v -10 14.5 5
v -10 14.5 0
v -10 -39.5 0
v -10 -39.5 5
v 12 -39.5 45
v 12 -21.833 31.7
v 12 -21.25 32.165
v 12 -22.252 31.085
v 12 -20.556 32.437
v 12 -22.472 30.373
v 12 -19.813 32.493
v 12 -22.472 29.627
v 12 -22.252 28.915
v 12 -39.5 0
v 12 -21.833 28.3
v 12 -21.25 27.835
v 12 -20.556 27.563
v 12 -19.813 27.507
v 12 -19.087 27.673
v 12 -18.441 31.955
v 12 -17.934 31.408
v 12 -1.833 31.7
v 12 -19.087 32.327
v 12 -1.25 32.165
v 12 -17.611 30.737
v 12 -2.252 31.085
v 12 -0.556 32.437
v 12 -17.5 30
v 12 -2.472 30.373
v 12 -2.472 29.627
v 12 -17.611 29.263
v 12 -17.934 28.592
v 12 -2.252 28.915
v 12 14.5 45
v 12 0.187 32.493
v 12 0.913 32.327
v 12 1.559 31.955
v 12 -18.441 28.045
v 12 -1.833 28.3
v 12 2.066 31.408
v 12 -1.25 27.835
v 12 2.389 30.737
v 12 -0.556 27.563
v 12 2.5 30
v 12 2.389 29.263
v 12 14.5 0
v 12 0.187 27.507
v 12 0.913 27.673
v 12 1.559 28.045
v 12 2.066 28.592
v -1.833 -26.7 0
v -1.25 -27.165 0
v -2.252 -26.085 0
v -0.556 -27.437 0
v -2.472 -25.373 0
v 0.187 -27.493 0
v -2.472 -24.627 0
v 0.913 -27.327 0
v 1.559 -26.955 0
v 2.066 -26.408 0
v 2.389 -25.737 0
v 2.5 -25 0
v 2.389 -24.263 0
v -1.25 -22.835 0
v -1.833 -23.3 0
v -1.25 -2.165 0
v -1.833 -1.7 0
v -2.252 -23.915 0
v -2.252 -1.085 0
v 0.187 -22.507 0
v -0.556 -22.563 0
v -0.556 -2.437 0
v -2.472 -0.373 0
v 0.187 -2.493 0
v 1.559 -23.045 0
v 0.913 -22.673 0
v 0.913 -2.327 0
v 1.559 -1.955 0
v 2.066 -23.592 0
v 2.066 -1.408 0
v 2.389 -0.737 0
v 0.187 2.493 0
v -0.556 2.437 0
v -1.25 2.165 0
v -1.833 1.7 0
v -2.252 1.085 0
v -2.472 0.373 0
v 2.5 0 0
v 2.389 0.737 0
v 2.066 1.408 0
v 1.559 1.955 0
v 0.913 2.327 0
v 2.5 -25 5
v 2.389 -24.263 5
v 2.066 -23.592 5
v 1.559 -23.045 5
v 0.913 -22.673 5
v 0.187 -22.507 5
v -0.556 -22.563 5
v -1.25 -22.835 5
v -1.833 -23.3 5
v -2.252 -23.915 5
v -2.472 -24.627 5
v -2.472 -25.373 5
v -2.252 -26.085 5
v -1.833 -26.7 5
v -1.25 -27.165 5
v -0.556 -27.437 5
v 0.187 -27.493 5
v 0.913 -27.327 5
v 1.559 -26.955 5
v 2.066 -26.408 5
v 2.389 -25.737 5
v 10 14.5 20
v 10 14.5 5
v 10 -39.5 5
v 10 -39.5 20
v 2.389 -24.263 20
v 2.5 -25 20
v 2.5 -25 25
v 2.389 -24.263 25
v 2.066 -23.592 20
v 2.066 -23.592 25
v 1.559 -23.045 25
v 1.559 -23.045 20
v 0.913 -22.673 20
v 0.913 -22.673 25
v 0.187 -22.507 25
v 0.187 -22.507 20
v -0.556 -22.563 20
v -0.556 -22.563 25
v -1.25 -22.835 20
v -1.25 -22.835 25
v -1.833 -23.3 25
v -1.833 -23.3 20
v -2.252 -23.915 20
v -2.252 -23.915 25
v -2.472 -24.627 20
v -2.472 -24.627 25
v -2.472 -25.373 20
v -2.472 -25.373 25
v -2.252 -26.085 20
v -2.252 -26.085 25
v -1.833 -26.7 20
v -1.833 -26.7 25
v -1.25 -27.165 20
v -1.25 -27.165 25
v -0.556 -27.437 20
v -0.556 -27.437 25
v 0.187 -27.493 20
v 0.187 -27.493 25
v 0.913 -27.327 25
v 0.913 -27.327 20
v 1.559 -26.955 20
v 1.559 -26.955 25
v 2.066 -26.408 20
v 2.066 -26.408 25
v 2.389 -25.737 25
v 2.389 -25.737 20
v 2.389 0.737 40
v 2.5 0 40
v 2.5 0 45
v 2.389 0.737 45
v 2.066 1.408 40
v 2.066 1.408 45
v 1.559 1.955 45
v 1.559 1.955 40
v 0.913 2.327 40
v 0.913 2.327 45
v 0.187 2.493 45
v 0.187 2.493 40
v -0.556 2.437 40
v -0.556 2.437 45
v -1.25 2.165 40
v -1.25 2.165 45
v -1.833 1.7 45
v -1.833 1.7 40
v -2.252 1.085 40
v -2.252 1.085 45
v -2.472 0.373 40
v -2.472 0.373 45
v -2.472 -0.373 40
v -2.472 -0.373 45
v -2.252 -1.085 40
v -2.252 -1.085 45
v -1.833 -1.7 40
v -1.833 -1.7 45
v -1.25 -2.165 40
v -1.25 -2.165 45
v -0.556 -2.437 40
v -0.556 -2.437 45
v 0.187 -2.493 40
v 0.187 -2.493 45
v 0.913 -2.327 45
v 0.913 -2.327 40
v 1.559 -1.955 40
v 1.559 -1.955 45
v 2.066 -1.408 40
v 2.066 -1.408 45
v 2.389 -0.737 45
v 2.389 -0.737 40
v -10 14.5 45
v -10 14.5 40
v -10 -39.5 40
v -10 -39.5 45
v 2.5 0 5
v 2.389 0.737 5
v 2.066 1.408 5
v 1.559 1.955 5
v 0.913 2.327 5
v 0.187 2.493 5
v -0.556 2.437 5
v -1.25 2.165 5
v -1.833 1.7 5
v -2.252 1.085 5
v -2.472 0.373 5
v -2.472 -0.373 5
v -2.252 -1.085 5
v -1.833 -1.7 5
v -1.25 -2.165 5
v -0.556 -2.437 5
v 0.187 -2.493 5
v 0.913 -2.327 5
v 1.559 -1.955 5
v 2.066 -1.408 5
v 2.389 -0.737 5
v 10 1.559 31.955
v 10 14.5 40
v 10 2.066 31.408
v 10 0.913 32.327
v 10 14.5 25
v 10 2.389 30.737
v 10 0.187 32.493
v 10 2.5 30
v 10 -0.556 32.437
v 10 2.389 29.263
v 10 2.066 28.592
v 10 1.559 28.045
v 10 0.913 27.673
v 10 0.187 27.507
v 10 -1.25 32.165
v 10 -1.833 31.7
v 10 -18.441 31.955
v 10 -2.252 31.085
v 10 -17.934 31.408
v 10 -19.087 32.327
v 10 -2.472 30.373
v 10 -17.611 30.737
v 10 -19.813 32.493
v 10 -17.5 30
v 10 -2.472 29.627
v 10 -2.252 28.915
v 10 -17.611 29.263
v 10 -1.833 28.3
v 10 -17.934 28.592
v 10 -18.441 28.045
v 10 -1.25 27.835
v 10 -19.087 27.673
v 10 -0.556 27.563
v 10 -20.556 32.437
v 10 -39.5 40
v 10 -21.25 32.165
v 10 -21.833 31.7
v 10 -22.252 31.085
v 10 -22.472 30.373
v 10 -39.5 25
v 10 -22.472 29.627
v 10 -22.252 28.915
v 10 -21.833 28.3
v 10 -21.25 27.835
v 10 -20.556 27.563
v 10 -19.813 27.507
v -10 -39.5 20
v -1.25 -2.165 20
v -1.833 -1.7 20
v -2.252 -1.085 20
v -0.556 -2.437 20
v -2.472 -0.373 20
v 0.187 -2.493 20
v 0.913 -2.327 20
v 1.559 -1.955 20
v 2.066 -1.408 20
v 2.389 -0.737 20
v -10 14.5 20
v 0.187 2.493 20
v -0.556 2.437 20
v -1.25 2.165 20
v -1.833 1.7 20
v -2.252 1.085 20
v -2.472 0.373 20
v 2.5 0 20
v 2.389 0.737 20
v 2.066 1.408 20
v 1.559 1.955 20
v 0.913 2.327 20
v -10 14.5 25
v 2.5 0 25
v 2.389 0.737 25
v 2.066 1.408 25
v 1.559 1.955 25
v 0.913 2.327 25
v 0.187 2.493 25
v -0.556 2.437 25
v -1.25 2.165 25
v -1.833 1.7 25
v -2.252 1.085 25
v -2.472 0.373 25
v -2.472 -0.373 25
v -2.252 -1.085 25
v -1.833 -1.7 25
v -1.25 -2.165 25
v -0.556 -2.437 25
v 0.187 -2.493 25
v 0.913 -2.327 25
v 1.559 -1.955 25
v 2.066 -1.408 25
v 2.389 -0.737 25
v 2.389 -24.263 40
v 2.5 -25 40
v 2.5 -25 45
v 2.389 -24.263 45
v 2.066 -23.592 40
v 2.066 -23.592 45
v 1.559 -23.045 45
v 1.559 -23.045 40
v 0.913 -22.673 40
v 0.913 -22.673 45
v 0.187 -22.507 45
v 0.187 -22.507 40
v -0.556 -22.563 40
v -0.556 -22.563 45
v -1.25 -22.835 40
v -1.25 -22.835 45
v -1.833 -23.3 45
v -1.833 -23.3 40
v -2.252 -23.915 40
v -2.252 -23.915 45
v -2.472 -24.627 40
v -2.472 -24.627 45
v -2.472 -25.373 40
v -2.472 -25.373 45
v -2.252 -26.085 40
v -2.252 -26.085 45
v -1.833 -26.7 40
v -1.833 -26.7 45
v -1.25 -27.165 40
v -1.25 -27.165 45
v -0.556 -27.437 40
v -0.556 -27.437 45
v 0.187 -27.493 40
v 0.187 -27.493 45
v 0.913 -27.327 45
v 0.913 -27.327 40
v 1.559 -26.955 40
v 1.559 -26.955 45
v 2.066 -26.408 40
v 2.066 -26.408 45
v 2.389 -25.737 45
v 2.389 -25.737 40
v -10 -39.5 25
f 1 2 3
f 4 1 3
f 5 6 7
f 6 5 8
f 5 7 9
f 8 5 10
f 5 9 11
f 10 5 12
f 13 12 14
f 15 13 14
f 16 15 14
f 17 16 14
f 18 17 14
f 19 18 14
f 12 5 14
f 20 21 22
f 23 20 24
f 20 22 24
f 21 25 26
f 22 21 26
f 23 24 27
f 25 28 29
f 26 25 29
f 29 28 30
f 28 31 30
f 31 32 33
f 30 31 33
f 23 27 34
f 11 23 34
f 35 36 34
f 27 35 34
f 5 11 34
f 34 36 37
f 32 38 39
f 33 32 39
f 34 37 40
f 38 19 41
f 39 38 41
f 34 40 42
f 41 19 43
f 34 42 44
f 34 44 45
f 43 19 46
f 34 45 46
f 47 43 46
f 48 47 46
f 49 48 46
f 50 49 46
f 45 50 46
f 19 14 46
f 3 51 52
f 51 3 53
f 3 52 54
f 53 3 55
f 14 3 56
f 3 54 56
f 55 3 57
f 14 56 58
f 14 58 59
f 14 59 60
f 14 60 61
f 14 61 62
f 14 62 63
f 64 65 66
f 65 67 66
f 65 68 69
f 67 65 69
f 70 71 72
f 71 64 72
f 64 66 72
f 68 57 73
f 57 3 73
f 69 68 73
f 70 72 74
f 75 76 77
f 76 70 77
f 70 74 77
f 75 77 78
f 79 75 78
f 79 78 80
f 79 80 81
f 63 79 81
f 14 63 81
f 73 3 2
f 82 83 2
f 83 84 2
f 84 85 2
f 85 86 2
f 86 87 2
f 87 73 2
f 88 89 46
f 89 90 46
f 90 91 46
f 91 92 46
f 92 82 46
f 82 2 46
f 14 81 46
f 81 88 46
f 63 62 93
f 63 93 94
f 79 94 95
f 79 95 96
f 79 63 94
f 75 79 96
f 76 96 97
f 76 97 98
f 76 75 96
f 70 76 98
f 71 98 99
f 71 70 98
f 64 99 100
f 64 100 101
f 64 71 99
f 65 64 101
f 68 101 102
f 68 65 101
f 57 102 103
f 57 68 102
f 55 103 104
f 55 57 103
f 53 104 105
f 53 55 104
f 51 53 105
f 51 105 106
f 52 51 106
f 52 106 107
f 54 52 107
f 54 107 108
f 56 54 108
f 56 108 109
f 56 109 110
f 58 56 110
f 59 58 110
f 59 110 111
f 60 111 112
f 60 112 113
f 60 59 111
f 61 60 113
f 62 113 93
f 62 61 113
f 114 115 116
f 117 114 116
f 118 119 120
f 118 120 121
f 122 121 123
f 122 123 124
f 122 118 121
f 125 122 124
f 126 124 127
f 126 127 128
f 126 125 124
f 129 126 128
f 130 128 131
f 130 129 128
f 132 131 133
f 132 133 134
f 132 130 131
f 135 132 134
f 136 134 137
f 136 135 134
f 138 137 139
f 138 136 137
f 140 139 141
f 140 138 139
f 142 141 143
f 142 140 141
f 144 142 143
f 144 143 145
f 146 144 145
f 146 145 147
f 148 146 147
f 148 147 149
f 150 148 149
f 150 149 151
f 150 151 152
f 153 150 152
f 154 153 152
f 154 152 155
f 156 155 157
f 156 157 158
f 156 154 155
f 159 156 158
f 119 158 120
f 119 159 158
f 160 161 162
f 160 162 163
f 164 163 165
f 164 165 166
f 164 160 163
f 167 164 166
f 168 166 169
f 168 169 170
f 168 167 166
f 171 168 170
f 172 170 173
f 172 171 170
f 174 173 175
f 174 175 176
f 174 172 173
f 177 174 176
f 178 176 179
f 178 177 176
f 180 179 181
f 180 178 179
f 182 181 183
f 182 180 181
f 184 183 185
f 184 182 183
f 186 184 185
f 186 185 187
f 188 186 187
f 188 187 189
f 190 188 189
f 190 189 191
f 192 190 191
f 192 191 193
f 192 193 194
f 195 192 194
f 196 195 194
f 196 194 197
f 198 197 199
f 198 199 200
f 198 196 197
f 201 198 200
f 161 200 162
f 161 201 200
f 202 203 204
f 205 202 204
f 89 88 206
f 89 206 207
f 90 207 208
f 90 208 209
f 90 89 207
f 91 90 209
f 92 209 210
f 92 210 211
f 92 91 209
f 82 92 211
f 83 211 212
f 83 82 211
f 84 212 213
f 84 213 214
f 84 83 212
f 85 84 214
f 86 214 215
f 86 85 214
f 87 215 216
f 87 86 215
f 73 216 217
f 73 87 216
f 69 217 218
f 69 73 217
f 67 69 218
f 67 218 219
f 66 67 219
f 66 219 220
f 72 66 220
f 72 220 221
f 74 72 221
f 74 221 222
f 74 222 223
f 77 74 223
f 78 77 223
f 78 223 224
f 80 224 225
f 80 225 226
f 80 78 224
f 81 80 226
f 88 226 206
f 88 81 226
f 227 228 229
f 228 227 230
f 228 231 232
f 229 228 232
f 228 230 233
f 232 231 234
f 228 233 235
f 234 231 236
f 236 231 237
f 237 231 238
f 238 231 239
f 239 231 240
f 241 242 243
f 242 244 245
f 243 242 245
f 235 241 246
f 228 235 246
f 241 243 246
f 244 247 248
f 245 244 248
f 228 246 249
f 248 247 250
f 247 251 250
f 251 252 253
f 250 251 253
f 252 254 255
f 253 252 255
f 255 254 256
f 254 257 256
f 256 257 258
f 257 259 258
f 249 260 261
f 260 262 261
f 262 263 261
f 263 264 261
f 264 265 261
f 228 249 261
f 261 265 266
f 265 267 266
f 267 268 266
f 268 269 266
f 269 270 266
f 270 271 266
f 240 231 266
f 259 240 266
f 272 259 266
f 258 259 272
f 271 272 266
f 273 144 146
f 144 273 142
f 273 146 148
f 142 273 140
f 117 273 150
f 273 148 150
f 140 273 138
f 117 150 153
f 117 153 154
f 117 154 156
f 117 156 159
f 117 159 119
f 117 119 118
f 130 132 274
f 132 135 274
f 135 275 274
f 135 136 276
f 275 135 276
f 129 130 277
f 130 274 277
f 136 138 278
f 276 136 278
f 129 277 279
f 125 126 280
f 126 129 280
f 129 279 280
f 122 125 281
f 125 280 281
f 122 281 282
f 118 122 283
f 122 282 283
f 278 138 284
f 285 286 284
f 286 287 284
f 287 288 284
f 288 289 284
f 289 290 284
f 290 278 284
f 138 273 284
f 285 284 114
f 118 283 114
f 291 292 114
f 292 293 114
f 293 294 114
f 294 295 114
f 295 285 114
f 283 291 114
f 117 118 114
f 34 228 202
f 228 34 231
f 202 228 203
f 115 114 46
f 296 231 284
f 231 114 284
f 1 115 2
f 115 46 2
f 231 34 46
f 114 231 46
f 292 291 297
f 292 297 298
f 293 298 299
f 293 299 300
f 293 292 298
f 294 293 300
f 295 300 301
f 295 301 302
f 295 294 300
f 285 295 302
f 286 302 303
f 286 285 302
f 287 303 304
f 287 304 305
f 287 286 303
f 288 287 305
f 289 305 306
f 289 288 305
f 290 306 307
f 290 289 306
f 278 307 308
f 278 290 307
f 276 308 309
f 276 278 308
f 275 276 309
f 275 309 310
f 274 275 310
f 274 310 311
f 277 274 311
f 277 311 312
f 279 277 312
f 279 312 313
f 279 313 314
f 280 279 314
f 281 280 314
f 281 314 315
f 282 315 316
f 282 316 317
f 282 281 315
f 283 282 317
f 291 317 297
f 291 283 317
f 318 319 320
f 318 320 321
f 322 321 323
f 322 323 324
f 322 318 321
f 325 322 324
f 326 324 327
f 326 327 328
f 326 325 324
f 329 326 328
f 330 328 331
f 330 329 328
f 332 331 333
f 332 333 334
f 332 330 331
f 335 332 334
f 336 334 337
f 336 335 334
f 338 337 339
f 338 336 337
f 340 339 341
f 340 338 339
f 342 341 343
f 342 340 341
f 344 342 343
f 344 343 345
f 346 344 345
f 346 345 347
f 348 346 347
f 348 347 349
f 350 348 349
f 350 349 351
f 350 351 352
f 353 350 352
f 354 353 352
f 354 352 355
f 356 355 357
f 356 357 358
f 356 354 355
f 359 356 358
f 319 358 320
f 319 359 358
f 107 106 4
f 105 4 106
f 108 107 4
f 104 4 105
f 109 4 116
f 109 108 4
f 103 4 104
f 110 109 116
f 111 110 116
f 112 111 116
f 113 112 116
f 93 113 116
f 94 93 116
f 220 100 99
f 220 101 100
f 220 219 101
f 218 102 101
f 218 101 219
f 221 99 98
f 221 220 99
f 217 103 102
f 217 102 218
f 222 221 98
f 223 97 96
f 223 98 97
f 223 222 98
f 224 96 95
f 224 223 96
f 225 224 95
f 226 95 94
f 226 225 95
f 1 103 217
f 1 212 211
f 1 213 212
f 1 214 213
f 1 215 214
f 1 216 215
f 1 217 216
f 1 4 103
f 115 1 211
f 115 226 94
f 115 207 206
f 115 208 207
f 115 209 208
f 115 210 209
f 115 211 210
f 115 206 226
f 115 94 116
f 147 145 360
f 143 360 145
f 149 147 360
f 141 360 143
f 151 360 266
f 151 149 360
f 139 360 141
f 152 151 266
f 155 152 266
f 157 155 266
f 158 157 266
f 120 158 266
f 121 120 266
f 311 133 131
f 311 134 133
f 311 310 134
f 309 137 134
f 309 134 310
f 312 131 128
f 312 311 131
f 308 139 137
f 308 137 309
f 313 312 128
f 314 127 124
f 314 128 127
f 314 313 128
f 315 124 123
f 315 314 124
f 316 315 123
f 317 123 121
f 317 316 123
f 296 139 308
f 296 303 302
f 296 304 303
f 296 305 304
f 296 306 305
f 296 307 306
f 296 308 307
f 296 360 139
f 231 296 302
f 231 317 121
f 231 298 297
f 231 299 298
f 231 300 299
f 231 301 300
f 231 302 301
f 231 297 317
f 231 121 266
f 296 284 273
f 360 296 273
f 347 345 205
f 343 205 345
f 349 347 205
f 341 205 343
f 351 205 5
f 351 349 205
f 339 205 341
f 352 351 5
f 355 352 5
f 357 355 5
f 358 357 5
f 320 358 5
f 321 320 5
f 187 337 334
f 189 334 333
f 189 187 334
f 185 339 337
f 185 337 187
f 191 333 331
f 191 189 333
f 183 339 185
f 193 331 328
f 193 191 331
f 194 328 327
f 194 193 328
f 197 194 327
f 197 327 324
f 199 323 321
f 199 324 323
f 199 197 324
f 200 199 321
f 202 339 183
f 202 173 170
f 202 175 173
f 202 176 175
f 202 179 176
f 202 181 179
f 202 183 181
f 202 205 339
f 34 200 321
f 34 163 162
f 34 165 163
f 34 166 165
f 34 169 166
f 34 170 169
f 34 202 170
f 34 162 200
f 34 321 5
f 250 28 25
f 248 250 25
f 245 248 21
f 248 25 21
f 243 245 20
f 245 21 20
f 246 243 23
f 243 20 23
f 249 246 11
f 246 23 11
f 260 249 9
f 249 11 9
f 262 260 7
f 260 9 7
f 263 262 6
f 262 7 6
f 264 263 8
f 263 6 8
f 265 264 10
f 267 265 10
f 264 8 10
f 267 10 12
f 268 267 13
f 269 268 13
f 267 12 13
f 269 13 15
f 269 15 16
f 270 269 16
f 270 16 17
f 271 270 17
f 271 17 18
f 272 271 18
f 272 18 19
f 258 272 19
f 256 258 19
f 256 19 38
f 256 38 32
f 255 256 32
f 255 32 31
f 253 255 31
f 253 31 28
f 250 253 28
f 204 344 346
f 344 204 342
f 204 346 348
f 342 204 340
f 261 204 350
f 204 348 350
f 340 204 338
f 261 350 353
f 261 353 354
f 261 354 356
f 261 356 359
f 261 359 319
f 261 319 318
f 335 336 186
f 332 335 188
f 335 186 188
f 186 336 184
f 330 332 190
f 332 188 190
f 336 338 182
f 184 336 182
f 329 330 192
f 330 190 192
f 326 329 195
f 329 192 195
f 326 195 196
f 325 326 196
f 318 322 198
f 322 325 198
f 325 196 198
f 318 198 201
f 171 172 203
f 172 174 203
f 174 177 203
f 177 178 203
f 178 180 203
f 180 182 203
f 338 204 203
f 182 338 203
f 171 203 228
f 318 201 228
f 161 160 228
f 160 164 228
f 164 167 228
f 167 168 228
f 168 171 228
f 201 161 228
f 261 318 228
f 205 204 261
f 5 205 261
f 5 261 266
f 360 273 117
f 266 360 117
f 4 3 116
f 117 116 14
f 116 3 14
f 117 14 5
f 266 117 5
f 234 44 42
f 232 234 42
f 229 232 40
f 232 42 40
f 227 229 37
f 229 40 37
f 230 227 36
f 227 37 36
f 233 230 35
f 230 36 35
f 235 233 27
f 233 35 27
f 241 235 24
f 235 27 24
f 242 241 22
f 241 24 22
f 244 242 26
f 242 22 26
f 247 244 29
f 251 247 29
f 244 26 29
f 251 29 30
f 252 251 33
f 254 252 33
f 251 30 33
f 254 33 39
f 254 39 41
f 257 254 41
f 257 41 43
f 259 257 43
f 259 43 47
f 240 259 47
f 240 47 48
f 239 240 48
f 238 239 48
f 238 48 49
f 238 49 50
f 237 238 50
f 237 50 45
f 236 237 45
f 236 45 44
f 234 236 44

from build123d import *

# Parameters (mm, degrees)
F0_W     = 20
F0_H     = 25
F0_R     = 6.5
F0_R_2   = 2.5
F0_H_2   = 2
F1_DEPTH = 5
F2_DEPTH = 45
F3_START = 20
F3_DEPTH = 5
F4_START = 40
F4_DEPTH = 5
F6_D     = 5
F6_DEPTH = 12.7
F6_TIP   = 1.5021515476


with BuildPart() as f1:
    # F0 (on Top) → F1 (new body)
    with BuildSketch(Plane.XY):
        Rectangle(F0_W, F0_H)
        Circle(F0_R, mode=Mode.SUBTRACT)
        Circle(F0_R)
        Circle(F0_R_2, mode=Mode.SUBTRACT)
        with Locations((0, 13.5)):
            Rectangle(F0_W, F0_H_2)
        with Locations((0, -25)):
            Rectangle(F0_W, F0_H)
        with Locations((0, -25)):
            Circle(F0_R, mode=Mode.SUBTRACT)
        with Locations((0, -25)):
            Circle(F0_R)
        with Locations((0, -25)):
            Circle(F0_R_2, mode=Mode.SUBTRACT)
        Polygon((12, -12.5), (10, -12.5), (10, -37.5), (10, -39.5), (12, -39.5), align=None)
        with Locations((0, -38.5)):
            Rectangle(F0_W, F0_H_2)
        Polygon((10, 14.5), (10, 12.5), (10, -12.5), (12, -12.5), (12, 14.5), align=None)
    extrude(amount=F1_DEPTH)

    # F0 (on Top) → F2 (join)
    with BuildSketch(Plane.XY):
        Polygon((12, -12.5), (10, -12.5), (10, -37.5), (10, -39.5), (12, -39.5), align=None)
        Polygon((10, 14.5), (10, 12.5), (10, -12.5), (12, -12.5), (12, 14.5), align=None)
    extrude(amount=F2_DEPTH)

    # F0 (on Top) → F3 (join)
    with BuildSketch(Plane.XY.offset(F3_START)):
        Rectangle(F0_W, F0_H)
        Circle(F0_R, mode=Mode.SUBTRACT)
        Circle(F0_R)
        Circle(F0_R_2, mode=Mode.SUBTRACT)
        with Locations((0, 13.5)):
            Rectangle(F0_W, F0_H_2)
        Polygon((12, -12.5), (10, -12.5), (10, -37.5), (10, -39.5), (12, -39.5), align=None)
        with Locations((0, -25)):
            Rectangle(F0_W, F0_H)
        with Locations((0, -25)):
            Circle(F0_R, mode=Mode.SUBTRACT)
        with Locations((0, -25)):
            Circle(F0_R)
        with Locations((0, -25)):
            Circle(F0_R_2, mode=Mode.SUBTRACT)
        with Locations((0, -38.5)):
            Rectangle(F0_W, F0_H_2)
        Polygon((10, 14.5), (10, 12.5), (10, -12.5), (12, -12.5), (12, 14.5), align=None)
    extrude(amount=F3_DEPTH)

    # F0 (on Top) → F4 (join)
    with BuildSketch(Plane.XY.offset(F4_START)):
        with Locations((0, 13.5)):
            Rectangle(F0_W, F0_H_2)
        Rectangle(F0_W, F0_H)
        Circle(F0_R, mode=Mode.SUBTRACT)
        Circle(F0_R)
        Circle(F0_R_2, mode=Mode.SUBTRACT)
        with Locations((0, -25)):
            Rectangle(F0_W, F0_H)
        with Locations((0, -25)):
            Circle(F0_R, mode=Mode.SUBTRACT)
        with Locations((0, -25)):
            Circle(F0_R)
        with Locations((0, -25)):
            Circle(F0_R_2, mode=Mode.SUBTRACT)
        Polygon((12, -12.5), (10, -12.5), (10, -37.5), (10, -39.5), (12, -39.5), align=None)
        with Locations((0, -38.5)):
            Rectangle(F0_W, F0_H_2)
        Polygon((10, 14.5), (10, 12.5), (10, -12.5), (12, -12.5), (12, 14.5), align=None)
    extrude(amount=F4_DEPTH)

    # F6
    with Locations(Plane(origin=(10, 0, 0), x_dir=(0, -1, 0), z_dir=(-1, 0, 0))):
        with Locations((0, 30), (20, 30)):
            Hole(F6_D / 2, depth=F6_DEPTH)
            with Locations((0, 0, -(F6_DEPTH + F6_TIP / 2))):  # 118° drill point
                Cone(0, F6_D / 2, F6_TIP, mode=Mode.SUBTRACT)


solid = f1.part
